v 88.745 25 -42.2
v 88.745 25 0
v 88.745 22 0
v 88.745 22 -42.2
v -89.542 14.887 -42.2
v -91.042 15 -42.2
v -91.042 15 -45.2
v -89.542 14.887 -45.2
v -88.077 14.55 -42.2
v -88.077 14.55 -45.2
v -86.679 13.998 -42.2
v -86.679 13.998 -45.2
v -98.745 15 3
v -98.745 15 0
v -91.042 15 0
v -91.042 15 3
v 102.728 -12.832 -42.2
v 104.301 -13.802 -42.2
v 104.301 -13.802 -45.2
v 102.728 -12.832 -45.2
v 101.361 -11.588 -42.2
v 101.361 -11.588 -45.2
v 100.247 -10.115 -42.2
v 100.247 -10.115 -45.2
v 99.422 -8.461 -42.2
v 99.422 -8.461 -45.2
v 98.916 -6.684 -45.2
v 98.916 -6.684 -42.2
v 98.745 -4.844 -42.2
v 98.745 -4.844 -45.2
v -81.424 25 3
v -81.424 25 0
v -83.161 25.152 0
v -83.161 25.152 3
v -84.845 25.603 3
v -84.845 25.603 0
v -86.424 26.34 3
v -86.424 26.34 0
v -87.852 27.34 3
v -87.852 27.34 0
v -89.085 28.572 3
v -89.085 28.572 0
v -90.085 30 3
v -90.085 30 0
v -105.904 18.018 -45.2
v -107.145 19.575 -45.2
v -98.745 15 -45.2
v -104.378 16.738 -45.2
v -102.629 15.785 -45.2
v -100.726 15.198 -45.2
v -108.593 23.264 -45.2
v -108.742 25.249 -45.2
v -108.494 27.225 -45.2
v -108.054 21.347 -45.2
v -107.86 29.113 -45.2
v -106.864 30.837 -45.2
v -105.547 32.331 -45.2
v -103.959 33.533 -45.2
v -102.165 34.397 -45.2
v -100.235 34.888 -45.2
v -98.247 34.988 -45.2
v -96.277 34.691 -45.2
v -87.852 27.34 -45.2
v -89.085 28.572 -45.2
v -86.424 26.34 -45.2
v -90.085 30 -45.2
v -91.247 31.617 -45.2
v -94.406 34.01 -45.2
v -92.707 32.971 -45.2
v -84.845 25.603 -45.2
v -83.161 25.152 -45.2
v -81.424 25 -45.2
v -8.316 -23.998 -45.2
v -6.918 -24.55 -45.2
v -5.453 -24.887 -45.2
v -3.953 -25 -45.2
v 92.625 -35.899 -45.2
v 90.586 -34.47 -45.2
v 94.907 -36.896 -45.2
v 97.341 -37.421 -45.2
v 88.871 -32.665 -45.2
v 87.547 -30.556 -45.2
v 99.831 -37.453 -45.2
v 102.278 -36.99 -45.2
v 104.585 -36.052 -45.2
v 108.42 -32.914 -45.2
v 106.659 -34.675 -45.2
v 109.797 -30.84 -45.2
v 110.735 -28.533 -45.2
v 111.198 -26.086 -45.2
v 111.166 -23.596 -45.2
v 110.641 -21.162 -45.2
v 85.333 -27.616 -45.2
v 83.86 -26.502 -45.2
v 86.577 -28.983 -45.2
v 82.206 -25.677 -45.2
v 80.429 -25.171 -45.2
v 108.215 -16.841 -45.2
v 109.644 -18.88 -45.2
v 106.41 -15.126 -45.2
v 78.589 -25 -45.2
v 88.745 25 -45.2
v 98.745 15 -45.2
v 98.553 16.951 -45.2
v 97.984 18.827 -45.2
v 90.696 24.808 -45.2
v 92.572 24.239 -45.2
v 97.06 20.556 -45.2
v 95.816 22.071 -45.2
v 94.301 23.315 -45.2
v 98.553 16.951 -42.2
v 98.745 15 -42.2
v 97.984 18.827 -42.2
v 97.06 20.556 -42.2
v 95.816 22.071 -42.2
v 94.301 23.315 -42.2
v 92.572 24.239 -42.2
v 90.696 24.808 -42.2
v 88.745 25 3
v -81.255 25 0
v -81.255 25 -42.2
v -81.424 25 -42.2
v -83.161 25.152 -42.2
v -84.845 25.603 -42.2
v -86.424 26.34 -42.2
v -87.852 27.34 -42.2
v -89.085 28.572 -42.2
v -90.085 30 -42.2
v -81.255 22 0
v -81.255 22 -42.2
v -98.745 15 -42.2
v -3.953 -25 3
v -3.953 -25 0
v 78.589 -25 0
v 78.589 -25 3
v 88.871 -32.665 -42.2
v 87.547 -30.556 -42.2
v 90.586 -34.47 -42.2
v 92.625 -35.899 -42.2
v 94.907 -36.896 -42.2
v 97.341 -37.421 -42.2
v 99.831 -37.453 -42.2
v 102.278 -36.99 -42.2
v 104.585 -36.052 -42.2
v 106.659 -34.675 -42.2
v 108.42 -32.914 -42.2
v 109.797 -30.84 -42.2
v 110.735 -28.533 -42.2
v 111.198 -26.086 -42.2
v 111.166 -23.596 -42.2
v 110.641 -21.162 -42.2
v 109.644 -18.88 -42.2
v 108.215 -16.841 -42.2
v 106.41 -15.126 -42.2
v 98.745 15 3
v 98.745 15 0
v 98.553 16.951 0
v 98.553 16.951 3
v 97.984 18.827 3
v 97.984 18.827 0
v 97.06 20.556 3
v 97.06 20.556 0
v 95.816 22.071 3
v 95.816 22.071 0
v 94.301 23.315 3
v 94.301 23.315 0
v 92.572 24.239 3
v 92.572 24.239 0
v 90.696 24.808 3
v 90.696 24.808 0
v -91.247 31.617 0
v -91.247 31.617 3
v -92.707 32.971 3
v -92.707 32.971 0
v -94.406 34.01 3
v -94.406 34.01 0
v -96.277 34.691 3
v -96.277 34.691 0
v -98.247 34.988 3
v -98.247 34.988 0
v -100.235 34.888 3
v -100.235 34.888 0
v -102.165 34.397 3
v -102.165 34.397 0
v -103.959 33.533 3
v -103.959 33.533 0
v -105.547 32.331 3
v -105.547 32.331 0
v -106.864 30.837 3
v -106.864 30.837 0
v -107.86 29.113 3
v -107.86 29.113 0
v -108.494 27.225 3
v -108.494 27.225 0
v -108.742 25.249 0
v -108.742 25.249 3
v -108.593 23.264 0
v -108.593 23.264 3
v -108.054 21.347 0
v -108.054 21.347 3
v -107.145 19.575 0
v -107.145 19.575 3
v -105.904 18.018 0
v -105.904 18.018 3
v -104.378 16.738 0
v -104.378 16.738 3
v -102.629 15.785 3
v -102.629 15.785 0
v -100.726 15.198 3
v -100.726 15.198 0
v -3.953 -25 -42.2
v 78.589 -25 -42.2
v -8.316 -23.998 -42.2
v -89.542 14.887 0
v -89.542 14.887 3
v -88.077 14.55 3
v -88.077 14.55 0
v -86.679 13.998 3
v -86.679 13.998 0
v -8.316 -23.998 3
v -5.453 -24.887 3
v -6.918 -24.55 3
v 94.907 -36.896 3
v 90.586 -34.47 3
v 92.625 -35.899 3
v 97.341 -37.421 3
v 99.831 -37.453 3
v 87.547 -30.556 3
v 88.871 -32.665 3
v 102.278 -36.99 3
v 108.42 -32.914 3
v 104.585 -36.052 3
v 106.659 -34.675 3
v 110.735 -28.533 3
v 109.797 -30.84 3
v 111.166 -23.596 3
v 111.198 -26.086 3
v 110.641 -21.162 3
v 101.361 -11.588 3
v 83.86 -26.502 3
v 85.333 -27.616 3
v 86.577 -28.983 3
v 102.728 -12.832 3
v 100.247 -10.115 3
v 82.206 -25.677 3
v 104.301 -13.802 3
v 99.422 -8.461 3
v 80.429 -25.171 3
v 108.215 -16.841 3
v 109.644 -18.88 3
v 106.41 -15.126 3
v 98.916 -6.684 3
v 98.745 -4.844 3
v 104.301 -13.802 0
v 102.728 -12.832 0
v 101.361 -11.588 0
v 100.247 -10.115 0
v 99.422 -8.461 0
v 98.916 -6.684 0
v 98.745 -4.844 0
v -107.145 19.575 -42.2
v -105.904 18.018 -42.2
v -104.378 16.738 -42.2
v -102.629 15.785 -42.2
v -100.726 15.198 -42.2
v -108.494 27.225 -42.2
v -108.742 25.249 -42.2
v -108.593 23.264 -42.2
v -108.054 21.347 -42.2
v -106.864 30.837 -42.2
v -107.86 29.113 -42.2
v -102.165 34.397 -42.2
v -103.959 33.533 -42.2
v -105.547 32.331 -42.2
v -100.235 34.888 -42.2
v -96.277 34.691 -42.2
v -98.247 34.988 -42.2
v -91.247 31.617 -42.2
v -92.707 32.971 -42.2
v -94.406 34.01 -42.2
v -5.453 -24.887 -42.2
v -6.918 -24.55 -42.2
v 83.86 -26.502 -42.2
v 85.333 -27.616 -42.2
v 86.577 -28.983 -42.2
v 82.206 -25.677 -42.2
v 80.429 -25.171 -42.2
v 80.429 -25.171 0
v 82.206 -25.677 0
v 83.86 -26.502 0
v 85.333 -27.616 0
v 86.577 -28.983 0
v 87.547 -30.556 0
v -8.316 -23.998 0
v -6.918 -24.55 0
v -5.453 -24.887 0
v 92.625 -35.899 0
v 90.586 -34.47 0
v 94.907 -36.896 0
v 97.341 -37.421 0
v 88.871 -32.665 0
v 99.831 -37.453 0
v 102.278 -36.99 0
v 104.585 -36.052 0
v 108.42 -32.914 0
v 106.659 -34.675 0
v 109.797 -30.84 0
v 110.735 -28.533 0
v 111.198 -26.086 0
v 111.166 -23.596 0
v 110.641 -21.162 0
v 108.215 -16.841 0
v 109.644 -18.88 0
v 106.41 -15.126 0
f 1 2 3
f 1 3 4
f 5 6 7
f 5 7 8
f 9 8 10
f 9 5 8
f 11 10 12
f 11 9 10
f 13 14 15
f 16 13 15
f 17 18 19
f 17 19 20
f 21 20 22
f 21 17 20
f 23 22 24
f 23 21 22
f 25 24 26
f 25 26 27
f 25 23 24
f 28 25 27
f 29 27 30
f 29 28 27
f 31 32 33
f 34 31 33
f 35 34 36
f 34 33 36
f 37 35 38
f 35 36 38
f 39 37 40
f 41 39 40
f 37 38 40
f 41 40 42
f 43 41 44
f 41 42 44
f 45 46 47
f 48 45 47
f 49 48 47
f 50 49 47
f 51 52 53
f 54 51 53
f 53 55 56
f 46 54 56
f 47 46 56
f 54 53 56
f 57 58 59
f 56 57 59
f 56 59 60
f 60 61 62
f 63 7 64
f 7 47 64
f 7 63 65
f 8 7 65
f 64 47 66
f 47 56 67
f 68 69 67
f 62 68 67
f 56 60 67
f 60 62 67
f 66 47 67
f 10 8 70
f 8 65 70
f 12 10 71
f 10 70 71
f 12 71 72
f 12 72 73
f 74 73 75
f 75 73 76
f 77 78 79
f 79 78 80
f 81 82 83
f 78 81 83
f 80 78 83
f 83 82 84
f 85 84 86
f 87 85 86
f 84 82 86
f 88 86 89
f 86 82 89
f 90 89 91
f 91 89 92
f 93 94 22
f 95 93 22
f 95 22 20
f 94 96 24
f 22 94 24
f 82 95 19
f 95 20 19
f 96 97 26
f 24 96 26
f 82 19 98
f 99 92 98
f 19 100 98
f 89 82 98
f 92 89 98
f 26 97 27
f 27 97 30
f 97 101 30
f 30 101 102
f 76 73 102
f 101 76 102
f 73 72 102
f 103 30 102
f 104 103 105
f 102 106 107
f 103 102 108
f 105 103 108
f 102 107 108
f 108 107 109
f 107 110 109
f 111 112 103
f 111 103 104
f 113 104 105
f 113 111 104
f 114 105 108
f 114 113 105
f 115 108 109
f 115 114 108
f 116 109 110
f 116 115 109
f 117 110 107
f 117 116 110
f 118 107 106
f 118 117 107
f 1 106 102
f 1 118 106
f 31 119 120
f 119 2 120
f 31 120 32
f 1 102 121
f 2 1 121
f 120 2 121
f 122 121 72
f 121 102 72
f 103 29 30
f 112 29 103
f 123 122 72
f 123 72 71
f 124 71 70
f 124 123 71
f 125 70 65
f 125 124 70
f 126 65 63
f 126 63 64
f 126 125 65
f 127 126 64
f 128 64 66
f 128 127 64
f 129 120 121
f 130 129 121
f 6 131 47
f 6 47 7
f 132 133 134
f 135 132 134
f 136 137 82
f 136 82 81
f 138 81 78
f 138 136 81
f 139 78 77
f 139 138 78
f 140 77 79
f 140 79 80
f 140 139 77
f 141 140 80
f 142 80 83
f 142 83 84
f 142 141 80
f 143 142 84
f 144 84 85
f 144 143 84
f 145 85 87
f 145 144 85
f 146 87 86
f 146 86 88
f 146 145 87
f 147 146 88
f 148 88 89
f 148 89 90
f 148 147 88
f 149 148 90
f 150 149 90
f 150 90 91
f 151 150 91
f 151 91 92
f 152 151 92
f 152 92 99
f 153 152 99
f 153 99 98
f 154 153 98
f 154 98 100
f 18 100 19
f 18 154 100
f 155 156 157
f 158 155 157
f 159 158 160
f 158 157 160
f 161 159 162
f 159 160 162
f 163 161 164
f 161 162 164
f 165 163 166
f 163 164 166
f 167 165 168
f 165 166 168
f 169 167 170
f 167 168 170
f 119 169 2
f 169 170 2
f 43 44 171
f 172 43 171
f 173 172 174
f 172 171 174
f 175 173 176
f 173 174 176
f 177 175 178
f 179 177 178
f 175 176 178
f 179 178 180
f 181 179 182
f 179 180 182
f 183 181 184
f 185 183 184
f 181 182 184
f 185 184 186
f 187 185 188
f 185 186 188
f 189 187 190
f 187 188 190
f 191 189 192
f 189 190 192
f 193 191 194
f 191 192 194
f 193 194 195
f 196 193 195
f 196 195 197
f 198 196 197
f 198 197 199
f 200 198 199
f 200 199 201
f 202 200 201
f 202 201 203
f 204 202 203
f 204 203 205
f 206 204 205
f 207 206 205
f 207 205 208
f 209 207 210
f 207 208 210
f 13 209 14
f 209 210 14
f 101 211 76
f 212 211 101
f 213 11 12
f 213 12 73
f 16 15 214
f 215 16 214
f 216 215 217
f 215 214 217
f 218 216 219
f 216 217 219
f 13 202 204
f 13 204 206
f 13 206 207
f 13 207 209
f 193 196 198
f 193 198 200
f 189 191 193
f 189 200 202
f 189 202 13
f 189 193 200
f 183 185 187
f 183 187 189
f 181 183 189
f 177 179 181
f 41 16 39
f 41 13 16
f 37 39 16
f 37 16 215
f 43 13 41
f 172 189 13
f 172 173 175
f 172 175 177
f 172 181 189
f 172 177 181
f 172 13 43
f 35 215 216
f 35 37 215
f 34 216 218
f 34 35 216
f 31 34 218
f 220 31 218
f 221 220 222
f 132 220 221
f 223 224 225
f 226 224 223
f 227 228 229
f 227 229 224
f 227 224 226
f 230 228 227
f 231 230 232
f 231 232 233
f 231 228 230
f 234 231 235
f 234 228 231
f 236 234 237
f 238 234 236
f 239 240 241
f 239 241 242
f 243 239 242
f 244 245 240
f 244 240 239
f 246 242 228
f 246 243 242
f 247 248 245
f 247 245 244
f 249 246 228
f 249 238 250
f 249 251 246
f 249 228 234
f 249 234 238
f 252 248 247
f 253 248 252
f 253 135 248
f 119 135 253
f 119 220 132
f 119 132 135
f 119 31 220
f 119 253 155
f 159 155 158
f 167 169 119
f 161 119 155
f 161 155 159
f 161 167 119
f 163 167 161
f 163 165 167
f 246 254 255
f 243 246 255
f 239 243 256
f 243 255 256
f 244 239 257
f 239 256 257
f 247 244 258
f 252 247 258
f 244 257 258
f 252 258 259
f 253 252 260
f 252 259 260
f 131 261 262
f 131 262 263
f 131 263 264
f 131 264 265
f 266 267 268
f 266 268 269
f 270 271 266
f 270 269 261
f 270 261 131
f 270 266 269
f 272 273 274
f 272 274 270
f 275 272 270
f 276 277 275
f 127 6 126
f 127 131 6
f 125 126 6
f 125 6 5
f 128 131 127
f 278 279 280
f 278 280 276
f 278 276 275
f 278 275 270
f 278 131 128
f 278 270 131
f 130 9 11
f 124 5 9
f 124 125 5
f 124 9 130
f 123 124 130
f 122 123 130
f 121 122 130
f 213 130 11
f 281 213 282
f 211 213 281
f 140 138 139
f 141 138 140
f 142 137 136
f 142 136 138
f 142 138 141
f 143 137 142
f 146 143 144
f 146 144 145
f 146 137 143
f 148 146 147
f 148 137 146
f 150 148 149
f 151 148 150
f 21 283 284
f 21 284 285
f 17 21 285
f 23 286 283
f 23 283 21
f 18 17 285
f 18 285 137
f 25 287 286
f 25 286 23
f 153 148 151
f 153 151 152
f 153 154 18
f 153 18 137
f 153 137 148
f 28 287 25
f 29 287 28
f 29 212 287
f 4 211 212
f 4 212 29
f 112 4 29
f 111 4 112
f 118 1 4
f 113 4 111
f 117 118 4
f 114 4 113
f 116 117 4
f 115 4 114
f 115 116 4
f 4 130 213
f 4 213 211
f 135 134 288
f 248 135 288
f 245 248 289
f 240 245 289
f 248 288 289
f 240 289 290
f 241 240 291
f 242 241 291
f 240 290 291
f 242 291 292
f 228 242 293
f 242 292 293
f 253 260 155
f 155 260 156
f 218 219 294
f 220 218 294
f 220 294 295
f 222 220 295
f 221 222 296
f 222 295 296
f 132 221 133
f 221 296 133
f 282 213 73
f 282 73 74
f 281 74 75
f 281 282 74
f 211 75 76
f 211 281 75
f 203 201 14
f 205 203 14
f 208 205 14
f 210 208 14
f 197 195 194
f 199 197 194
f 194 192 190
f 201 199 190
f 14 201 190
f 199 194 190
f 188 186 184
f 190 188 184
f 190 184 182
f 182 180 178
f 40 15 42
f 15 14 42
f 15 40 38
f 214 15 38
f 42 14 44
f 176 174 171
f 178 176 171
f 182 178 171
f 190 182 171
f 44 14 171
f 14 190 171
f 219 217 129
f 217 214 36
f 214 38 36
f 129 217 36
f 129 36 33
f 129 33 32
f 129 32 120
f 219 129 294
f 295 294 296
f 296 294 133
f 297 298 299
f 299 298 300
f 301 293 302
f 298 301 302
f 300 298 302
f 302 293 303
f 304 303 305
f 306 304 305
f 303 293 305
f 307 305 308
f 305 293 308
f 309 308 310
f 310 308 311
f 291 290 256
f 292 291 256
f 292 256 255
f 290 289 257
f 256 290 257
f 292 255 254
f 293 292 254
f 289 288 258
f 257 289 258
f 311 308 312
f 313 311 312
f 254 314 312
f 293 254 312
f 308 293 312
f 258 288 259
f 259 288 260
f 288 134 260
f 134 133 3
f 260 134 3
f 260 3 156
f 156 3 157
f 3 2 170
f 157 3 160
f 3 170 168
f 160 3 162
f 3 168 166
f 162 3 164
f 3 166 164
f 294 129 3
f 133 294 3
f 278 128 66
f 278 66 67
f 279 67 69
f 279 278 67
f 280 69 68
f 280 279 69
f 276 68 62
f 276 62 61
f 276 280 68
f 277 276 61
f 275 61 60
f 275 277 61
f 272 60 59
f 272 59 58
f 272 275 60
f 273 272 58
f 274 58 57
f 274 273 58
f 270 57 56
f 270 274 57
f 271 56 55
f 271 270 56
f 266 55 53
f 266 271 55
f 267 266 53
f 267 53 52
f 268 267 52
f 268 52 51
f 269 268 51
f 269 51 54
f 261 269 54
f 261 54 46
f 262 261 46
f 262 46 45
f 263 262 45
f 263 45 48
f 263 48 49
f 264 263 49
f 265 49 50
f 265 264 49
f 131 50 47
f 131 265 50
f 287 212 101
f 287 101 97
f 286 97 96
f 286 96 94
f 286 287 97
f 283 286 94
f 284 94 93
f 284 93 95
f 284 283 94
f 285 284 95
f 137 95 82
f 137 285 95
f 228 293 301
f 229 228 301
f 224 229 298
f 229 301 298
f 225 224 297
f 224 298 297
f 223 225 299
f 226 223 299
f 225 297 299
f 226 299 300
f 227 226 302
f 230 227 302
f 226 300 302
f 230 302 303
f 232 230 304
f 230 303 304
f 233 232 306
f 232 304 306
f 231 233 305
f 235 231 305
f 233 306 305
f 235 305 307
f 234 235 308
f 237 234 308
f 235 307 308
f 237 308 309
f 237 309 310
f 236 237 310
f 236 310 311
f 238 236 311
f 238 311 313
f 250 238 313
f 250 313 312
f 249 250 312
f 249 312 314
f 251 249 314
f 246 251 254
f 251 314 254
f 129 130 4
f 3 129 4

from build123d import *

# Parameters (mm, degrees)
SALIENTE_EXTRUIR1_DEPTH = 3
CROQUIS2_W              = 170
CROQUIS2_H              = 48.2
SALIENTE_EXTRUIR2_DEPTH = 3


with BuildPart() as part:
    # Croquis1 → Saliente-Extruir1 (new body)
    with BuildSketch(Plane.XY):
        with BuildLine():
            Line((-98.745, 15), (-91.041526265, 15))
            ThreePointArc((-91.041526265, 15), (-88.803264961, 14.746290901), (-86.678577108, 13.998037267))
            Line((-86.678577108, 13.998037267), (-8.316422892, -23.998037267))
            ThreePointArc((-8.316422892, -23.998037267), (-6.191735039, -24.746290901), (-3.953473735, -25))
            Line((-3.953473735, -25), (78.589355629, -25))
            ThreePointArc((78.589355629, -25), (83.859818396, -26.501634144), (87.547419794, -30.555555556))
            ThreePointArc((87.547419794, -30.555555556), (107.583834765, -33.838834765), (104.300555556, -13.802419794))
            ThreePointArc((104.300555556, -13.802419794), (100.246634144, -10.114818396), (98.745, -4.844355629))
            Line((98.745, -4.844355629), (98.745, 15))
            ThreePointArc((98.745, 15), (95.816067812, 22.071067812), (88.745, 25))
            Line((88.745, 25), (-81.424491924, 25))
            ThreePointArc((-81.424491924, 25), (-86.424491924, 26.339745962), (-90.084745962, 30))
            ThreePointArc((-90.084745962, 30), (-107.405254038, 30), (-98.745, 15))
        make_face()
    extrude(amount=SALIENTE_EXTRUIR1_DEPTH)


with BuildPart() as body_2:
    # Simetría2: mirrored copy
    add(part.part.mirror(Plane.XY.offset(-21.1)))


with BuildPart() as part_1:
    add(part.part)

    add(body_2.part)  # Saliente-Extruir2 merges body 2
    # Croquis2 → Saliente-Extruir2 (add)
    with BuildSketch(Plane(origin=(0, 25, 0), x_dir=(1, 0, 0), z_dir=(0, 1, 0))):
        with Locations((3.745, 21.1)):
            Rectangle(CROQUIS2_W, CROQUIS2_H)
    extrude(amount=-SALIENTE_EXTRUIR2_DEPTH)


solid = part_1.part
